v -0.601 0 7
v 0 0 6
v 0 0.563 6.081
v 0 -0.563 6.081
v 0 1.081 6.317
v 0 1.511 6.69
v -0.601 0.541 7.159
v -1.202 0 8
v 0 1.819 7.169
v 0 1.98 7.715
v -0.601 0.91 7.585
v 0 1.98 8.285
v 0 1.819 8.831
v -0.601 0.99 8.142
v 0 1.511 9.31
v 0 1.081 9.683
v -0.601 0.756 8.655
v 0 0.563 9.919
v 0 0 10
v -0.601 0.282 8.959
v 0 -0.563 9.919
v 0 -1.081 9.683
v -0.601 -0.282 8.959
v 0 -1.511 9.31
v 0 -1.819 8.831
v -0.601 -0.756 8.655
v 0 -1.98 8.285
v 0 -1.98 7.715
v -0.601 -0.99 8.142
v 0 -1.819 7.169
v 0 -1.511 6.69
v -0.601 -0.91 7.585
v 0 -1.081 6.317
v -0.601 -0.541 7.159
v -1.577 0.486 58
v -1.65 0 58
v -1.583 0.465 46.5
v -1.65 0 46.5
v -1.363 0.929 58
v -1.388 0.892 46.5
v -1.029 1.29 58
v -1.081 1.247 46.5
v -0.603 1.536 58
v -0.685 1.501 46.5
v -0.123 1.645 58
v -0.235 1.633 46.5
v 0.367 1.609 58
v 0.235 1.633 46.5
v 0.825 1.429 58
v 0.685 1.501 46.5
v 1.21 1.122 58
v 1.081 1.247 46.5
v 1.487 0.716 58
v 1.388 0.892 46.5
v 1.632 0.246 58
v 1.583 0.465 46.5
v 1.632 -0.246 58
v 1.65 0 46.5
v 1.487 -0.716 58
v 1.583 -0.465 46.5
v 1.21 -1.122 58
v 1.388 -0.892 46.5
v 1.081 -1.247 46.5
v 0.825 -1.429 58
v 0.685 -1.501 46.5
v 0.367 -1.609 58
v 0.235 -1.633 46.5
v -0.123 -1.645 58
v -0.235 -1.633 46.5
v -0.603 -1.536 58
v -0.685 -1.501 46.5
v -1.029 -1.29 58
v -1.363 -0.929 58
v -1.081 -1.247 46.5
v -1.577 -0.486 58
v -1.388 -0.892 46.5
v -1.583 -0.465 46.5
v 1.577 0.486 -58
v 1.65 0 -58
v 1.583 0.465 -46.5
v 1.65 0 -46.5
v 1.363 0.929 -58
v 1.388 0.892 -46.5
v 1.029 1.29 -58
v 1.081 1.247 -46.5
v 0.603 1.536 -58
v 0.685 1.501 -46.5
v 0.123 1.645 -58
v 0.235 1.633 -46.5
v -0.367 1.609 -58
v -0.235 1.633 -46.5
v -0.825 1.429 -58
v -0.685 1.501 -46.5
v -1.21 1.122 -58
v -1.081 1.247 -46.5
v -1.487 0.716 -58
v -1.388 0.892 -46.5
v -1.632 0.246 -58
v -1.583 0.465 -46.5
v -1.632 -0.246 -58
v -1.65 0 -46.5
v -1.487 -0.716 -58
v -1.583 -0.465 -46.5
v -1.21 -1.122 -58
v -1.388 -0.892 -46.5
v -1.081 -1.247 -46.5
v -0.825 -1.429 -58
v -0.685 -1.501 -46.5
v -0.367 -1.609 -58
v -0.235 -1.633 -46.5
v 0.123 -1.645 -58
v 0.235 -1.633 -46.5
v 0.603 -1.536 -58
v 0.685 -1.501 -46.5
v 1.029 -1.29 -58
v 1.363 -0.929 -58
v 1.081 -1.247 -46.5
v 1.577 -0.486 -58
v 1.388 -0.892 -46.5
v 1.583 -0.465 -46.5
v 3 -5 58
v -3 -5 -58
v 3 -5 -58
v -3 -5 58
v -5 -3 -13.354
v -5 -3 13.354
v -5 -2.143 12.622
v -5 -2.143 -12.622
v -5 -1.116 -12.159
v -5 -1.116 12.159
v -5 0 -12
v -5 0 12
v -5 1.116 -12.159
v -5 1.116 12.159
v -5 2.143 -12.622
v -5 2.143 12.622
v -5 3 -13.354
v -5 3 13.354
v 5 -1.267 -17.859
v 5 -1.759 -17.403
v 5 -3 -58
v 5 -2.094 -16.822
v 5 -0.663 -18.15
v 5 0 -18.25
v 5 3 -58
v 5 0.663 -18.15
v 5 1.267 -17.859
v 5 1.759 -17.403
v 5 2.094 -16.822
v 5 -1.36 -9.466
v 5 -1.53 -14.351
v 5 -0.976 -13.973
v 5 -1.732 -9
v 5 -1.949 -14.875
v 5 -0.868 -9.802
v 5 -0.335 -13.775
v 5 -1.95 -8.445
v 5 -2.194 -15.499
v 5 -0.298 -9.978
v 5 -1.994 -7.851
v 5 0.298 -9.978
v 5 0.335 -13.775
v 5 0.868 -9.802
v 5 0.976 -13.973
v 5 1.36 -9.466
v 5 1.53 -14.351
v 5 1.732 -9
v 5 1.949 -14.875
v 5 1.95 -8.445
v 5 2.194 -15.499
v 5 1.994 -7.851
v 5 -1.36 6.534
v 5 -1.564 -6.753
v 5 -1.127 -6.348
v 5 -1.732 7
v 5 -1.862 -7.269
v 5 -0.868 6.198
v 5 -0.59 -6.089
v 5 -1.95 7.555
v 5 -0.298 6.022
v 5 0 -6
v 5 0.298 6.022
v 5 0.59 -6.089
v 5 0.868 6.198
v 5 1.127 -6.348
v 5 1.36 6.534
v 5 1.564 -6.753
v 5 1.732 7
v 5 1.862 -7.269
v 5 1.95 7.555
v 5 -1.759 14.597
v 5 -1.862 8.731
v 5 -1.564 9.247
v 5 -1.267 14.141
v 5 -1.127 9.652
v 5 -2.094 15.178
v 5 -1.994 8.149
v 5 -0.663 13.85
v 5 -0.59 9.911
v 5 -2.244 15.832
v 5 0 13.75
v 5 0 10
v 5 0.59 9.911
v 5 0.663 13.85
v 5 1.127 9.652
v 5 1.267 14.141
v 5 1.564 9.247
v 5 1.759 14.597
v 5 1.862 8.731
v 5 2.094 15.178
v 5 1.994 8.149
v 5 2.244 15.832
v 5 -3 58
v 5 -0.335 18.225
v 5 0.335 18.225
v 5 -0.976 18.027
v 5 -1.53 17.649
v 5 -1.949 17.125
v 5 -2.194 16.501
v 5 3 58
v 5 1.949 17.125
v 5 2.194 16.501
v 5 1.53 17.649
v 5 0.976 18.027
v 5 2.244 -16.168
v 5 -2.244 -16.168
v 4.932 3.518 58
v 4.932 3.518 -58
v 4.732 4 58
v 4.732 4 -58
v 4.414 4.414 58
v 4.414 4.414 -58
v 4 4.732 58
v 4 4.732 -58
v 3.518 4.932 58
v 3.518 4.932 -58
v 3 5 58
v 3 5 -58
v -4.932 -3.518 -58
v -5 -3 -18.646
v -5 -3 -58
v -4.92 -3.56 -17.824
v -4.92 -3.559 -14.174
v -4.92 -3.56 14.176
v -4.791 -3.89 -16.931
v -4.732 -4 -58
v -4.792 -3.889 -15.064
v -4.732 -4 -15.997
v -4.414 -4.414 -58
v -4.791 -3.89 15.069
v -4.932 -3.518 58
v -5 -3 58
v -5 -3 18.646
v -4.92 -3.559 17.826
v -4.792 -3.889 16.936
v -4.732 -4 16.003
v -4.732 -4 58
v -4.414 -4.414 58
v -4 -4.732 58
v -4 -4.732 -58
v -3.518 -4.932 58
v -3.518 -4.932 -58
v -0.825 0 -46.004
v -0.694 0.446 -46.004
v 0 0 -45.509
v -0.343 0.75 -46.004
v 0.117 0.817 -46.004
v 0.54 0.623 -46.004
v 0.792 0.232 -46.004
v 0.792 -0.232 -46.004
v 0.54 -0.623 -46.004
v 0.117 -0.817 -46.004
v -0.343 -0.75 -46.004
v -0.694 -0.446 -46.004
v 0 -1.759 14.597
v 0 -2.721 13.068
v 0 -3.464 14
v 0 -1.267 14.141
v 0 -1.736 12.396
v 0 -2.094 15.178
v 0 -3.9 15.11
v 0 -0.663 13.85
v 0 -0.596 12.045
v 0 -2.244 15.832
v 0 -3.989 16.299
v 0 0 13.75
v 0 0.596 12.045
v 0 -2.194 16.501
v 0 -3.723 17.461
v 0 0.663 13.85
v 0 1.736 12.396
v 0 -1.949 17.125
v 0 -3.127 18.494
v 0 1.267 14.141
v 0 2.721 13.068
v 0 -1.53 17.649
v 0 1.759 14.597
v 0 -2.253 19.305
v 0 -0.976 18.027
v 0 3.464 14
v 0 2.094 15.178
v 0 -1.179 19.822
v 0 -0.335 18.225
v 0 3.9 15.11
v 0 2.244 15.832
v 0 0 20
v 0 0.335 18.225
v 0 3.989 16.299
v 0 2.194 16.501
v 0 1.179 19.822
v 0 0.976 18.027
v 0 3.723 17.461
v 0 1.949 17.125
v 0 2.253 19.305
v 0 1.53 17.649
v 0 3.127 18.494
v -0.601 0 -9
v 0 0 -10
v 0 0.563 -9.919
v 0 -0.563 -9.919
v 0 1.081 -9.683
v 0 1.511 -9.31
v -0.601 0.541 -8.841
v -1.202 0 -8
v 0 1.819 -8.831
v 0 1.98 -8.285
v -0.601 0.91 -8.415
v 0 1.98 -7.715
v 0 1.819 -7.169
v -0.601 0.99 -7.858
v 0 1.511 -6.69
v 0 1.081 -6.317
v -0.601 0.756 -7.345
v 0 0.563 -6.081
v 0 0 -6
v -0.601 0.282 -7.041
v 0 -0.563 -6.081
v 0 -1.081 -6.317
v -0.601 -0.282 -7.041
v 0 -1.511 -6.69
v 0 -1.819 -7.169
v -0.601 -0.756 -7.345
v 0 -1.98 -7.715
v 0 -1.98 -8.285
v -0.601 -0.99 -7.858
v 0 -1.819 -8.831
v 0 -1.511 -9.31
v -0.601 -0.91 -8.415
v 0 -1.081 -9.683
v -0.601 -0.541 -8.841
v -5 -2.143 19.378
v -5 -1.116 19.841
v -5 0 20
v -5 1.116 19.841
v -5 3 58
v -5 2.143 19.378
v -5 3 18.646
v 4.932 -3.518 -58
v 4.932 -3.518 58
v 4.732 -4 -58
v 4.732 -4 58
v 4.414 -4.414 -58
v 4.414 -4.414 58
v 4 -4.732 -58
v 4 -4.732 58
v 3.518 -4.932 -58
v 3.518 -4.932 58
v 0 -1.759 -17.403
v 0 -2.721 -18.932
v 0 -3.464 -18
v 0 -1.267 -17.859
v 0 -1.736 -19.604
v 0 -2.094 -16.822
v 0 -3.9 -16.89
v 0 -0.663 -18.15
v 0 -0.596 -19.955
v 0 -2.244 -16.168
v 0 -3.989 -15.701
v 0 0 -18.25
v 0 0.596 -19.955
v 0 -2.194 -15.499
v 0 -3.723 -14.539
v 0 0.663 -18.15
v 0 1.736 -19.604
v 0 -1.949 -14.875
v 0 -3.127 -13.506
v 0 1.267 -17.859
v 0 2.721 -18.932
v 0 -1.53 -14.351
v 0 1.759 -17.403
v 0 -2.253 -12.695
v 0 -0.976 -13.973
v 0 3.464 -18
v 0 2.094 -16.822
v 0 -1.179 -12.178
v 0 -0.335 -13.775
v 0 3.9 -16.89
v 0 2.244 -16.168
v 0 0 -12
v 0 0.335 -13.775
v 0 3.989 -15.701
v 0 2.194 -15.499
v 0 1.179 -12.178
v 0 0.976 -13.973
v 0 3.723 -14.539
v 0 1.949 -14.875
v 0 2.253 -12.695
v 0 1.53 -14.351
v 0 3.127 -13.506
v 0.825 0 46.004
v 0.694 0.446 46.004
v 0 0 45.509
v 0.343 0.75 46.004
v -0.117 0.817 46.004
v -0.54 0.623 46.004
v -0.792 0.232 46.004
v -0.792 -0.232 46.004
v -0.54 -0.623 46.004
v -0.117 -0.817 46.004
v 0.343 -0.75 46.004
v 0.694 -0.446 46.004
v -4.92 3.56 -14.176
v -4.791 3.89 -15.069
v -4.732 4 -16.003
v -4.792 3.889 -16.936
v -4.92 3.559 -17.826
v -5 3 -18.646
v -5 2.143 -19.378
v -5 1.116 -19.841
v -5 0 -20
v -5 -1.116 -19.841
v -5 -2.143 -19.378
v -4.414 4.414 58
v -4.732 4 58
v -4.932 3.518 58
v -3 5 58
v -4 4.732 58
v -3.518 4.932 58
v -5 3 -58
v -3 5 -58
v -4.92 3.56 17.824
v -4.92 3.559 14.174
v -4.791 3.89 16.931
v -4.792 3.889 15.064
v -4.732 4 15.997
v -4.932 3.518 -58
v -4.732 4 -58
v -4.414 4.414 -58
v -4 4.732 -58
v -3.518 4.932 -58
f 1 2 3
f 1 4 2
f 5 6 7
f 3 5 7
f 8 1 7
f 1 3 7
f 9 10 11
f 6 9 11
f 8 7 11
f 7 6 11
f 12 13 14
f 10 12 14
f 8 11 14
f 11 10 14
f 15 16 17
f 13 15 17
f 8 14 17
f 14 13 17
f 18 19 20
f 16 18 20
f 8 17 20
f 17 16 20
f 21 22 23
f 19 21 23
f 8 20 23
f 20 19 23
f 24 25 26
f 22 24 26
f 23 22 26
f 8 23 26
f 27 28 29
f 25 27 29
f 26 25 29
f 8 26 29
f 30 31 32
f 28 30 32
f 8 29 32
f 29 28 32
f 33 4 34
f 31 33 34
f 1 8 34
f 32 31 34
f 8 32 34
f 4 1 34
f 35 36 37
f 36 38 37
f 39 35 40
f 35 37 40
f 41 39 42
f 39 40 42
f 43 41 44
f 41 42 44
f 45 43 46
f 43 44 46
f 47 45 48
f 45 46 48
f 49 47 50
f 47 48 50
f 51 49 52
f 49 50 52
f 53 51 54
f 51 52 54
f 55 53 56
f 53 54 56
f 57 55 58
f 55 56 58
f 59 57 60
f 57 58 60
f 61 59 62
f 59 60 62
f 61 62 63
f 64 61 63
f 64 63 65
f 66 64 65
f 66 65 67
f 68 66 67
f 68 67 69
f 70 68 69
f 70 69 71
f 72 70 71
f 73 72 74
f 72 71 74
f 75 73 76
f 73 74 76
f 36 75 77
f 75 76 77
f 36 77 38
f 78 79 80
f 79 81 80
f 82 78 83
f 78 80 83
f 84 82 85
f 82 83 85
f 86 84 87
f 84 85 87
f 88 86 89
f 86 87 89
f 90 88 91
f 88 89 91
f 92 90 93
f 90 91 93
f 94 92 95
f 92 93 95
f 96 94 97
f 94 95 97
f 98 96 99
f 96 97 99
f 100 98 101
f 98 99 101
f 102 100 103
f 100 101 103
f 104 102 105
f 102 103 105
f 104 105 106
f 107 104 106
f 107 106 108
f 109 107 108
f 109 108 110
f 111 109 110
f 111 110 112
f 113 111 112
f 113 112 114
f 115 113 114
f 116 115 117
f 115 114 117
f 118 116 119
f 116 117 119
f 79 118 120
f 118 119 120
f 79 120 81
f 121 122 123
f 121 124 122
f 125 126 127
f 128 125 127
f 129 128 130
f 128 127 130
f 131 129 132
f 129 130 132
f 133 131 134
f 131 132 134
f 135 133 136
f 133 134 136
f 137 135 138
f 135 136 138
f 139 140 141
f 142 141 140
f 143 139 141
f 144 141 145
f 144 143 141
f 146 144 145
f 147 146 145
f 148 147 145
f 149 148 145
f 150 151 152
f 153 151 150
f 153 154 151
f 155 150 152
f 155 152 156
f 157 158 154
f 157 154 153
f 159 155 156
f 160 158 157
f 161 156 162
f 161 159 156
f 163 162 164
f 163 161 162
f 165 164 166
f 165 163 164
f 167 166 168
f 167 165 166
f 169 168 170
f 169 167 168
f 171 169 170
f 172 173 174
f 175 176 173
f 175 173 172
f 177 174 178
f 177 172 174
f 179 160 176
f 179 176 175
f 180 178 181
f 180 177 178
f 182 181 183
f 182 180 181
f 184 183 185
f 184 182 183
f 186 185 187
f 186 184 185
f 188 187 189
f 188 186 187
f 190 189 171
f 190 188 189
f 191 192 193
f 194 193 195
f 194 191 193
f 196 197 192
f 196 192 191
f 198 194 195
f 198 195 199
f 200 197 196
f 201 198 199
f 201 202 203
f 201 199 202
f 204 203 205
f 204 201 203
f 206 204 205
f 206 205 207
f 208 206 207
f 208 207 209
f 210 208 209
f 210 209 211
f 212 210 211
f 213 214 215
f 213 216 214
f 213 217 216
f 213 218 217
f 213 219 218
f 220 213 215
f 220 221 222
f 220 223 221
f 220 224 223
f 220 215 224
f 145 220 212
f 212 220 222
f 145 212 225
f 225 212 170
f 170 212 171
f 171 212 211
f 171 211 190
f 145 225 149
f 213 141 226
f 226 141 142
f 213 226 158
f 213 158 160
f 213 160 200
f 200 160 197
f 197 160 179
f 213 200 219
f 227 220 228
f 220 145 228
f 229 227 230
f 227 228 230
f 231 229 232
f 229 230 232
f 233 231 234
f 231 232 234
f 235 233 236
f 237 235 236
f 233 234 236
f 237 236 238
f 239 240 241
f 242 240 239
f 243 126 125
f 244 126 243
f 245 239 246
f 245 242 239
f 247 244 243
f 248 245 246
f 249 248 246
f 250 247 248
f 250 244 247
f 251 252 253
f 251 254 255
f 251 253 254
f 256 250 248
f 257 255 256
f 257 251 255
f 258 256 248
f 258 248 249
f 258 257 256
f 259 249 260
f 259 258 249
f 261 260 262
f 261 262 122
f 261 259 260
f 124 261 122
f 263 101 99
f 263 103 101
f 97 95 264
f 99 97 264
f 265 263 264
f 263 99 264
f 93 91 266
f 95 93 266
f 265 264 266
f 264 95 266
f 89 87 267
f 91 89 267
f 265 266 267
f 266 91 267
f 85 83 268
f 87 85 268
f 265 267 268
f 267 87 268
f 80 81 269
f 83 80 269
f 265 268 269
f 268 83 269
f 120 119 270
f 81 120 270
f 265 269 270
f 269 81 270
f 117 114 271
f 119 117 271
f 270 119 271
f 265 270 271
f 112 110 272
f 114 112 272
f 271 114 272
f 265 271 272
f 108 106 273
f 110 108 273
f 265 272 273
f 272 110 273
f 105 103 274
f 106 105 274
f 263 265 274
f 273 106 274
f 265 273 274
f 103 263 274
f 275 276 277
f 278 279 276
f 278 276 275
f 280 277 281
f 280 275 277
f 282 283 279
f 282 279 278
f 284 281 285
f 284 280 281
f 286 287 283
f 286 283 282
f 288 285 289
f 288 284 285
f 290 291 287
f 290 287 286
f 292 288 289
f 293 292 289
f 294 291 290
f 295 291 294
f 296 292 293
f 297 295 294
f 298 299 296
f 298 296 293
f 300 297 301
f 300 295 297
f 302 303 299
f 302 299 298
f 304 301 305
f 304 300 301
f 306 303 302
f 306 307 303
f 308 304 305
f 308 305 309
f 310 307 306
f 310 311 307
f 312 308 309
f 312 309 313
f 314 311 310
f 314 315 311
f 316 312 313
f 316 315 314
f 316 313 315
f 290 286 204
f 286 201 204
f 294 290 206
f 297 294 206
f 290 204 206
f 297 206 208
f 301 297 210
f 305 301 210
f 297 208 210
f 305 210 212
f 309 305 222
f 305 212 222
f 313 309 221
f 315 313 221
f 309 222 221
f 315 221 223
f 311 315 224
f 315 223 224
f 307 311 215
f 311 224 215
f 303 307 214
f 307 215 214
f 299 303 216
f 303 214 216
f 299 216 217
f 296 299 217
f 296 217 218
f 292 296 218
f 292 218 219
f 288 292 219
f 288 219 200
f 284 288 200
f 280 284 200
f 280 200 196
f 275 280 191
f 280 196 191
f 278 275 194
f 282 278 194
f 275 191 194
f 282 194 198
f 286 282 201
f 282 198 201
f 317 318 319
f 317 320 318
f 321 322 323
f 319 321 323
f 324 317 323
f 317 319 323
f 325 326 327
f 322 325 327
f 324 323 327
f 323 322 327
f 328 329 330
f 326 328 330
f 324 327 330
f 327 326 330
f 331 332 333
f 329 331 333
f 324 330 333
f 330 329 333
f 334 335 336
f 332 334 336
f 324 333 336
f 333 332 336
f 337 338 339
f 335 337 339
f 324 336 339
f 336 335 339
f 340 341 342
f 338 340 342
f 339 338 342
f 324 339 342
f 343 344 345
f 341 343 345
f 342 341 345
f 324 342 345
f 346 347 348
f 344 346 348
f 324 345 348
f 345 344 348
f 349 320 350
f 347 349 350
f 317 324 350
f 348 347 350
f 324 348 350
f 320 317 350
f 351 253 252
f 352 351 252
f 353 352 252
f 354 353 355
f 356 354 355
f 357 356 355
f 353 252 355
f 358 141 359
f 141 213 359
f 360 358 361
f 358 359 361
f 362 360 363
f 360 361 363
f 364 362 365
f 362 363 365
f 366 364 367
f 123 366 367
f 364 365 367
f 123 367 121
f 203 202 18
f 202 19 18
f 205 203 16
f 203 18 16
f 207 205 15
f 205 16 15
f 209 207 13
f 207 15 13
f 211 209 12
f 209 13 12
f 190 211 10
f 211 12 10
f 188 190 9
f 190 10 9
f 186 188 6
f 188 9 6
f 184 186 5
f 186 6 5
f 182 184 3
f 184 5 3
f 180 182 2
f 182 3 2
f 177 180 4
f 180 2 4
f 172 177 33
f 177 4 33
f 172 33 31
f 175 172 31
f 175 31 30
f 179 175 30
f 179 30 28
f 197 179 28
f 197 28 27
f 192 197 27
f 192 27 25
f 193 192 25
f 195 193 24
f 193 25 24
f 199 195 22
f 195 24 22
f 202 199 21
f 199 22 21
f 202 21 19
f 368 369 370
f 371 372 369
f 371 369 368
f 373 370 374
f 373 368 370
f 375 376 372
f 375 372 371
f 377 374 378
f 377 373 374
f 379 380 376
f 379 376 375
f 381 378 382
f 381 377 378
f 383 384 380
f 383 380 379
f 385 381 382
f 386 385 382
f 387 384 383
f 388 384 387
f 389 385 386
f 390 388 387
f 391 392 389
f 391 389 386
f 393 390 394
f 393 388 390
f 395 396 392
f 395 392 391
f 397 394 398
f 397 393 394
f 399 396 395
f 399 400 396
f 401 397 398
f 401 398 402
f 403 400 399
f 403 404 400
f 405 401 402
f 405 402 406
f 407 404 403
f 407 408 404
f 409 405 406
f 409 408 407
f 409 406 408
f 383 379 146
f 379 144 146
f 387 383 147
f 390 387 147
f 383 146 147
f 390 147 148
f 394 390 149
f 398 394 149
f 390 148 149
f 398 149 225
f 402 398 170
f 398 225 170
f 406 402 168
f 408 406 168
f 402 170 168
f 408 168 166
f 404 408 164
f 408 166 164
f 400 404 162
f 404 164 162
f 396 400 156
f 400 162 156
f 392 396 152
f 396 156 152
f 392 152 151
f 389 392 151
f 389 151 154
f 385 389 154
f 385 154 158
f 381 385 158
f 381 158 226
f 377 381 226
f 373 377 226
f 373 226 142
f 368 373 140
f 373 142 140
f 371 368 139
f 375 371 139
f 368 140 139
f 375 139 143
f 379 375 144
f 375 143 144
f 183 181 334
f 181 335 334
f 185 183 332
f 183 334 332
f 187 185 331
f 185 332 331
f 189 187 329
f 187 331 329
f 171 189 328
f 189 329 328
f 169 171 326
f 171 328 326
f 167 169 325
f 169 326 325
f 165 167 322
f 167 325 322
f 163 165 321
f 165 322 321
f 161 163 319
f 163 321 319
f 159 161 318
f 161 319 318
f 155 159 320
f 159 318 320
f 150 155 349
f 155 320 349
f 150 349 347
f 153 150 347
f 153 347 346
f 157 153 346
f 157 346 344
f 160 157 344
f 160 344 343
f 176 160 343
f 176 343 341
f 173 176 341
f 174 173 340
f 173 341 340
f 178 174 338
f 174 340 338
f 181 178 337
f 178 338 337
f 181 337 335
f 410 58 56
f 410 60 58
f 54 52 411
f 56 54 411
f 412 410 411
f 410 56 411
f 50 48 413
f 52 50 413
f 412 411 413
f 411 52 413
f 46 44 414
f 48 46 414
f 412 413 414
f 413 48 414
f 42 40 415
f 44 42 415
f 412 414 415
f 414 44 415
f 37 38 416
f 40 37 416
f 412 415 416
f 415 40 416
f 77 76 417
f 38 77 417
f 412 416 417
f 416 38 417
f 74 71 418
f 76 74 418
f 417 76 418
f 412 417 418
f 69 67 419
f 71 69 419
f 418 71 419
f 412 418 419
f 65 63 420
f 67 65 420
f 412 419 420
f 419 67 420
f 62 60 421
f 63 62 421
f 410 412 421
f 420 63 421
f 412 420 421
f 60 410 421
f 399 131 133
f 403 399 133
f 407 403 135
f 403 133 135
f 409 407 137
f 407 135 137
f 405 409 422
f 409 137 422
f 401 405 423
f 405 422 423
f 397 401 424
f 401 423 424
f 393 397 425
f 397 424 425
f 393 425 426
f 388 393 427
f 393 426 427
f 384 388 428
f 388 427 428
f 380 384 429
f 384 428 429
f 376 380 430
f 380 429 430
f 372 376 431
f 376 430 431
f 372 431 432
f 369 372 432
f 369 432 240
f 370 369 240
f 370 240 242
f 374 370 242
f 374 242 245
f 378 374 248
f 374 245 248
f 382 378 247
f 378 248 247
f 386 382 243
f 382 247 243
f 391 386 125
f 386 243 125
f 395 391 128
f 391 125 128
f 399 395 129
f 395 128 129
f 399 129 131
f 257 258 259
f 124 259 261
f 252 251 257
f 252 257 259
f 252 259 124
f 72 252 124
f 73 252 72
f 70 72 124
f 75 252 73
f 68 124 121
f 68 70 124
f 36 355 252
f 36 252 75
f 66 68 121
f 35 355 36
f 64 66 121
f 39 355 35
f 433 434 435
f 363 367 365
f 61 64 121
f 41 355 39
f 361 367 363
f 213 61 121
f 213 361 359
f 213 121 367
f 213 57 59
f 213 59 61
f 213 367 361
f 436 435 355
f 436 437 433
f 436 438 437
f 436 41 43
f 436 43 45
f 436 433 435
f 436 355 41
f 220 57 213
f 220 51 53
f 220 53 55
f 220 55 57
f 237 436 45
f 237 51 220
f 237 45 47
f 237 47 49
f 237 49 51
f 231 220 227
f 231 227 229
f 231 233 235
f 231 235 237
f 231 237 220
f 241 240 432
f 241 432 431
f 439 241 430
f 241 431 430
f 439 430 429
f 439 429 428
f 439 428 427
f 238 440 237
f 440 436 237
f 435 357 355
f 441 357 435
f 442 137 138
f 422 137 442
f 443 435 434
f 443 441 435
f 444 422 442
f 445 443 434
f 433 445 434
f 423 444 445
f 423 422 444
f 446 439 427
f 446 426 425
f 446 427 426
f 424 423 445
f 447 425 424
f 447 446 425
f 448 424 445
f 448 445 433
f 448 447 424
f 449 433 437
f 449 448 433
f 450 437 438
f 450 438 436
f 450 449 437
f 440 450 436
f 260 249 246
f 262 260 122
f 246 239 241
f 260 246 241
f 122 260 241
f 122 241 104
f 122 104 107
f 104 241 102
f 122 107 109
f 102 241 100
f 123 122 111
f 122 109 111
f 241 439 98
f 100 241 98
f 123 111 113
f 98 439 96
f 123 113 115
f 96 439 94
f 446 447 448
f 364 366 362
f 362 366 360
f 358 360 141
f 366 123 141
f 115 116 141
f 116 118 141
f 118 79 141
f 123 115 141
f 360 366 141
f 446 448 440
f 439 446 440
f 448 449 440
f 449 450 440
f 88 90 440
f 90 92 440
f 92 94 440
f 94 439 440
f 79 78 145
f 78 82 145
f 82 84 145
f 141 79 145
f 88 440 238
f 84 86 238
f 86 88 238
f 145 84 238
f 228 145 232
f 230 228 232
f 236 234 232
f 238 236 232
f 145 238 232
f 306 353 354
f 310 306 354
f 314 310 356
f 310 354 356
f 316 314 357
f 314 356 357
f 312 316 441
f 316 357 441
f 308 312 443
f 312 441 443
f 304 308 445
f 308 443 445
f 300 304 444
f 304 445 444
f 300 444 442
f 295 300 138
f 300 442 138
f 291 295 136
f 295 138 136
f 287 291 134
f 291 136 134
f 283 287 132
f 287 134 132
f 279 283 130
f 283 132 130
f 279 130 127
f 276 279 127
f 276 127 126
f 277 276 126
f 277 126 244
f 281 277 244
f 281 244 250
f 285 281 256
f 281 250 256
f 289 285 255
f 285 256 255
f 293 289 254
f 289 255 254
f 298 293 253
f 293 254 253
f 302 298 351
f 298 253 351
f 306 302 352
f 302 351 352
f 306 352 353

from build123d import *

# Parameters (mm, degrees)
ESQUISSE1_W                                        = 10
ESQUISSE1_H                                        = 10
BOSS_EXTRU_1_DEPTH                                 = 58
CONG_1_R                                           = 2
TROU_TARAUD_M41_D                                  = 3.3
TROU_TARAUD_M41_DEPTH                              = 11.5
TROU_TARAUD_M41_TIP                                = 0.991420021
TROU_TARAUD_M42_D                                  = 3.3
TROU_TARAUD_M42_DEPTH                              = 11.5
TROU_TARAUD_M42_TIP                                = 0.991420021
DIAM_TRE_DU_PER_AGE_4_0_4_1_D                      = 4
DIAM_TRE_DU_PER_AGE_4_0_4_1_DEPTH                  = 5
DIAM_TRE_DU_PER_AGE_4_0_4_1_TIP                    = 1.201721238
CHAMBRAGE_POUR_VIS_T_TE_HEXAGONALE_M41_D           = 4.5
CHAMBRAGE_POUR_VIS_T_TE_HEXAGONALE_M41_CBORE_D     = 8
CHAMBRAGE_POUR_VIS_T_TE_HEXAGONALE_M41_CBORE_DEPTH = 5


with BuildPart() as part:
    # Esquisse1 → Boss.-Extru.1 (new, symmetric)
    with BuildSketch(Plane.XY):
        Rectangle(ESQUISSE1_W, ESQUISSE1_H)
    extrude(amount=BOSS_EXTRU_1_DEPTH, both=True)

    # Congé1
    cong_1_edges = [part.edges().sort_by_distance(p)[0] for p in [
        (-5, 5, 0),
        (5, 5, 0),
        (5, -5, 0),
        (-5, -5, 0),
    ]]
    fillet(cong_1_edges, radius=CONG_1_R)

    # Trou taraudé M41
    with Locations(Plane.XY.offset(58)):
        with Locations((0, 0)):
            Hole(TROU_TARAUD_M41_D / 2, depth=TROU_TARAUD_M41_DEPTH)
            with Locations((0, 0, -(TROU_TARAUD_M41_DEPTH + TROU_TARAUD_M41_TIP / 2))):  # 118° drill point
                Cone(0, TROU_TARAUD_M41_D / 2, TROU_TARAUD_M41_TIP, mode=Mode.SUBTRACT)

    # Trou taraudé M42
    with Locations(Plane(origin=(0, 0, -58), x_dir=(-1, 0, 0), z_dir=(0, 0, -1))):
        with Locations((0, 0)):
            Hole(TROU_TARAUD_M42_D / 2, depth=TROU_TARAUD_M42_DEPTH)
            with Locations((0, 0, -(TROU_TARAUD_M42_DEPTH + TROU_TARAUD_M42_TIP / 2))):  # 118° drill point
                Cone(0, TROU_TARAUD_M42_D / 2, TROU_TARAUD_M42_TIP, mode=Mode.SUBTRACT)

    # Diamètre du perçage Ø4.0 (4)1
    with Locations(Plane(origin=(5, 0, 0), x_dir=(0, 0, -1), z_dir=(1, 0, 0))):
        with Locations((8, 0), (-8, 0)):
            Hole(DIAM_TRE_DU_PER_AGE_4_0_4_1_D / 2, depth=DIAM_TRE_DU_PER_AGE_4_0_4_1_DEPTH)
            with Locations((0, 0, -(DIAM_TRE_DU_PER_AGE_4_0_4_1_DEPTH + DIAM_TRE_DU_PER_AGE_4_0_4_1_TIP / 2))):  # 118° drill point
                Cone(0, DIAM_TRE_DU_PER_AGE_4_0_4_1_D / 2, DIAM_TRE_DU_PER_AGE_4_0_4_1_TIP, mode=Mode.SUBTRACT)

    # Chambrage pour vis à tête hexagonale M41 (through all)
    with Locations(Plane.ZY.offset(5)):
        with Locations((-16, 0), (16, 0)):
            CounterBoreHole(CHAMBRAGE_POUR_VIS_T_TE_HEXAGONALE_M41_D / 2, CHAMBRAGE_POUR_VIS_T_TE_HEXAGONALE_M41_CBORE_D / 2, CHAMBRAGE_POUR_VIS_T_TE_HEXAGONALE_M41_CBORE_DEPTH)


solid = part.part
